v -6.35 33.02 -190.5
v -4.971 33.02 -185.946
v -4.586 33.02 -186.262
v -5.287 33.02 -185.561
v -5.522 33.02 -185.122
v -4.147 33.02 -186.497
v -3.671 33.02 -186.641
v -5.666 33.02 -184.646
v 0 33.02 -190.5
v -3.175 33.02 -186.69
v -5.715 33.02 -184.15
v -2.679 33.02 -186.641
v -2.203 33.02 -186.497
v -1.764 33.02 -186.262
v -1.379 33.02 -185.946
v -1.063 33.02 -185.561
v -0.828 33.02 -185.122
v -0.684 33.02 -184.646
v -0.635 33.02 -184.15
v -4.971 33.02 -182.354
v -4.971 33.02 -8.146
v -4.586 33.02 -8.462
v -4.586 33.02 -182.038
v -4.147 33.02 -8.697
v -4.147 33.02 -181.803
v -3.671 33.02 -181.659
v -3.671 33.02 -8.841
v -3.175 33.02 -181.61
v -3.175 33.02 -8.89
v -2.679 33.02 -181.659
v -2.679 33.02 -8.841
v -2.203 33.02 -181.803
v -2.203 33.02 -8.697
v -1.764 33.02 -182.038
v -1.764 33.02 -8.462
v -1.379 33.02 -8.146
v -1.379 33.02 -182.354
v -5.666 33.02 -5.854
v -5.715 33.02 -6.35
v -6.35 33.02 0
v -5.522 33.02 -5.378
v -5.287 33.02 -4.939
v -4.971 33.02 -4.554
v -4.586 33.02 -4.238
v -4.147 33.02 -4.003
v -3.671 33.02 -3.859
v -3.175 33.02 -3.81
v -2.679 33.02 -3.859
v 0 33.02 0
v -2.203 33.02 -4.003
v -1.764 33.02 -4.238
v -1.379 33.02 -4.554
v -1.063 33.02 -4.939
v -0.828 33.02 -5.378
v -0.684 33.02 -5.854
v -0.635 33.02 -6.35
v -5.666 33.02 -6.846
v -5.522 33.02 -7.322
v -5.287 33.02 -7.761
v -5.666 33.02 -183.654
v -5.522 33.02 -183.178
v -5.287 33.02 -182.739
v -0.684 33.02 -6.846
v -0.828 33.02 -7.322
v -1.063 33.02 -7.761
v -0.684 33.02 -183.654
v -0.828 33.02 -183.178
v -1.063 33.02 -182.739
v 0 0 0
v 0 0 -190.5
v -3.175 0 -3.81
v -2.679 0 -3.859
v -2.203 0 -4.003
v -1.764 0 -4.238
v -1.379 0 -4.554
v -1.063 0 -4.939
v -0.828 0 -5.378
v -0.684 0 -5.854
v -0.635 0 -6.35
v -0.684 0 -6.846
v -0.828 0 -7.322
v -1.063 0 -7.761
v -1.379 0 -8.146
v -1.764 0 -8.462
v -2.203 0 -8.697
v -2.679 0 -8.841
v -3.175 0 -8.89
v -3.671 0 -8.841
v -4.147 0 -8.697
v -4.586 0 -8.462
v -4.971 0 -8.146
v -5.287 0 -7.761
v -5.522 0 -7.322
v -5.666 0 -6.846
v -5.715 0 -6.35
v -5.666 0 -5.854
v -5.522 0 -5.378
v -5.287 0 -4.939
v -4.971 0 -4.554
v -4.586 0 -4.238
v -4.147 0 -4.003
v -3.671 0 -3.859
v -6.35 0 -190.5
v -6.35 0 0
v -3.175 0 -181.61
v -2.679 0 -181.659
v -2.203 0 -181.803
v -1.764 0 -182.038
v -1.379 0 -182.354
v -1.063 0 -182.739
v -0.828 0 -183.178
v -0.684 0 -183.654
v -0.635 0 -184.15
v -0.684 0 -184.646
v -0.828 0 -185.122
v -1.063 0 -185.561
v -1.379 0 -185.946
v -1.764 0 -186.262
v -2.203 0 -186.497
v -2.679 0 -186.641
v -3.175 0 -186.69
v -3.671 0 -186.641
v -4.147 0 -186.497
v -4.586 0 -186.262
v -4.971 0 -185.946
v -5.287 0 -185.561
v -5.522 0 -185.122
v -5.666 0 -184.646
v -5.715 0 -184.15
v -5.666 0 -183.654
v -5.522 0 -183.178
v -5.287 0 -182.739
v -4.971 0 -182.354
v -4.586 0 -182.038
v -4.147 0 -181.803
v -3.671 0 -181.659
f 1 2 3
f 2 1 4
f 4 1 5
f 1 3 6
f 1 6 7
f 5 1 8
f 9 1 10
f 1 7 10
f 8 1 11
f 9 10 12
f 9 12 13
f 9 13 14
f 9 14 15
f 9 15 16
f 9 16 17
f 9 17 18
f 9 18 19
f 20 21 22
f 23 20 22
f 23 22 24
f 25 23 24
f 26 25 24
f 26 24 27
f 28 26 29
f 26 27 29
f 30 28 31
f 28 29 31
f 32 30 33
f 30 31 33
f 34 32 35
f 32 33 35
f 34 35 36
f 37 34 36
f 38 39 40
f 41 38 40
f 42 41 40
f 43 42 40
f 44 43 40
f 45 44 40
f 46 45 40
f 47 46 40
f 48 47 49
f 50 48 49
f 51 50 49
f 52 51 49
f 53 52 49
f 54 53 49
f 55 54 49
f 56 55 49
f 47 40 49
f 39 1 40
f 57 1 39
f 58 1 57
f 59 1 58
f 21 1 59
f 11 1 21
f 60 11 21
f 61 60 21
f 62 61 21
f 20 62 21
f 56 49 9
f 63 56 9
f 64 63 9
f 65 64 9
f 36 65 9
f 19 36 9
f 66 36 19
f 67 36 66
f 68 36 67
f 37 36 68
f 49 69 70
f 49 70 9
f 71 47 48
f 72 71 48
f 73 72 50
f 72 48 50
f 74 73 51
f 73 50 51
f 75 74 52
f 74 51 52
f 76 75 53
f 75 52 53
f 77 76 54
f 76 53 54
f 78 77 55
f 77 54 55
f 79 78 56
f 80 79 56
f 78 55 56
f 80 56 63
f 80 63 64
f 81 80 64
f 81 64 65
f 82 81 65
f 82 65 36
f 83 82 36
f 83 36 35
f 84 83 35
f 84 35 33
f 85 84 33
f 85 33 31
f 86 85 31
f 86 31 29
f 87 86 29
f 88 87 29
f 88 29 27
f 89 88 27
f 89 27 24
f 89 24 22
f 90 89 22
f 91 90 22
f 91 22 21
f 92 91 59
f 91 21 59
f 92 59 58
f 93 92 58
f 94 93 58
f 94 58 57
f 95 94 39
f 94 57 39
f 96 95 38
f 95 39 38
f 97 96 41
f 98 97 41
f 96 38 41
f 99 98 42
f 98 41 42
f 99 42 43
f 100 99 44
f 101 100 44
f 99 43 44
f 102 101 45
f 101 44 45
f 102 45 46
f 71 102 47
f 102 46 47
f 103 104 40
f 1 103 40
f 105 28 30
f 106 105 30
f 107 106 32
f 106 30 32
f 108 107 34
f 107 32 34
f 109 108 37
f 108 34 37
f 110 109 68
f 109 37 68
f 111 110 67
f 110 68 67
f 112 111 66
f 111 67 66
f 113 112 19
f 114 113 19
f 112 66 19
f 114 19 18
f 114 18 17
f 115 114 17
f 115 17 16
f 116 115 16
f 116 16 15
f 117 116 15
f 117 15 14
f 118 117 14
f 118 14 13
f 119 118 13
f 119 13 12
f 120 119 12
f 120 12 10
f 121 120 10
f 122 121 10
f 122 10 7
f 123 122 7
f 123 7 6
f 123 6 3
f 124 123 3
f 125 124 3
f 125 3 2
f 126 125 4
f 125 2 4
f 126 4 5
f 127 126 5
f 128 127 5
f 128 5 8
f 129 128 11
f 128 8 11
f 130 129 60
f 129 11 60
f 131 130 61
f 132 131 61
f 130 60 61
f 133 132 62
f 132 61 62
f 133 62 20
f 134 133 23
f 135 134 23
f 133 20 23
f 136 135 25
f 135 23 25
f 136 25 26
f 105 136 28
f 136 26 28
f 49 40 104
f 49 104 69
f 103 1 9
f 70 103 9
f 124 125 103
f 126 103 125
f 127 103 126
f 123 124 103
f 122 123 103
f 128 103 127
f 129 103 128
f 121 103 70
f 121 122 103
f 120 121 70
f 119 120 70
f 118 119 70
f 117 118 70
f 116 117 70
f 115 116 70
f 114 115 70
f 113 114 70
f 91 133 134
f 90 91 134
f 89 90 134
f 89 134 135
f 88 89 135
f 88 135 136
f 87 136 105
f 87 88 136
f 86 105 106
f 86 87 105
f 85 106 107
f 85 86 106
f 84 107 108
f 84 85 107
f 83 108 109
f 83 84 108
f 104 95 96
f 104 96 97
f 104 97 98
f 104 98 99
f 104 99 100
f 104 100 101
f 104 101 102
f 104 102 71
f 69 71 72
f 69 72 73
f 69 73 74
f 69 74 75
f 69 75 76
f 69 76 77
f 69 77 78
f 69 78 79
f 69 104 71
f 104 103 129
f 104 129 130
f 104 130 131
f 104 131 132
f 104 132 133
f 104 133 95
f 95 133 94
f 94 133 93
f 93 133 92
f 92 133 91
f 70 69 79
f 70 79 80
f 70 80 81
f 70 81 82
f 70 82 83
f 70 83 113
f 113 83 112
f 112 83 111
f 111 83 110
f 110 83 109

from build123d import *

# Parameters (mm, degrees)
SKETCH1_W           = 6.35
SKETCH1_H           = 33.02
BOSS_EXTRUDE1_DEPTH = 190.5
SKETCH3_R           = 2.54
CUT_EXTRUDE2_DEPTH  = 194.444805823


with BuildPart() as part:
    # Sketch1 → Boss-Extrude1 (new body)
    with BuildSketch(Plane.XY):
        with Locations((-3.175, 16.51)):
            Rectangle(SKETCH1_W, SKETCH1_H)
    extrude(amount=-BOSS_EXTRUDE1_DEPTH)

    # Sketch3 → Cut-Extrude2 (cut, through all)
    with BuildSketch(Plane(origin=(0, 33.02, 0), x_dir=(1, 0, 0), z_dir=(0, 1, 0))):
        with Locations(Location((-3.175, 6.35, 0), (0, 0, 270))):
            Circle(SKETCH3_R)
        with Locations(Location((-3.175, 184.15, 0), (0, 0, 270))):
            Circle(SKETCH3_R)
    extrude(amount=-CUT_EXTRUDE2_DEPTH, mode=Mode.SUBTRACT)


solid = part.part
